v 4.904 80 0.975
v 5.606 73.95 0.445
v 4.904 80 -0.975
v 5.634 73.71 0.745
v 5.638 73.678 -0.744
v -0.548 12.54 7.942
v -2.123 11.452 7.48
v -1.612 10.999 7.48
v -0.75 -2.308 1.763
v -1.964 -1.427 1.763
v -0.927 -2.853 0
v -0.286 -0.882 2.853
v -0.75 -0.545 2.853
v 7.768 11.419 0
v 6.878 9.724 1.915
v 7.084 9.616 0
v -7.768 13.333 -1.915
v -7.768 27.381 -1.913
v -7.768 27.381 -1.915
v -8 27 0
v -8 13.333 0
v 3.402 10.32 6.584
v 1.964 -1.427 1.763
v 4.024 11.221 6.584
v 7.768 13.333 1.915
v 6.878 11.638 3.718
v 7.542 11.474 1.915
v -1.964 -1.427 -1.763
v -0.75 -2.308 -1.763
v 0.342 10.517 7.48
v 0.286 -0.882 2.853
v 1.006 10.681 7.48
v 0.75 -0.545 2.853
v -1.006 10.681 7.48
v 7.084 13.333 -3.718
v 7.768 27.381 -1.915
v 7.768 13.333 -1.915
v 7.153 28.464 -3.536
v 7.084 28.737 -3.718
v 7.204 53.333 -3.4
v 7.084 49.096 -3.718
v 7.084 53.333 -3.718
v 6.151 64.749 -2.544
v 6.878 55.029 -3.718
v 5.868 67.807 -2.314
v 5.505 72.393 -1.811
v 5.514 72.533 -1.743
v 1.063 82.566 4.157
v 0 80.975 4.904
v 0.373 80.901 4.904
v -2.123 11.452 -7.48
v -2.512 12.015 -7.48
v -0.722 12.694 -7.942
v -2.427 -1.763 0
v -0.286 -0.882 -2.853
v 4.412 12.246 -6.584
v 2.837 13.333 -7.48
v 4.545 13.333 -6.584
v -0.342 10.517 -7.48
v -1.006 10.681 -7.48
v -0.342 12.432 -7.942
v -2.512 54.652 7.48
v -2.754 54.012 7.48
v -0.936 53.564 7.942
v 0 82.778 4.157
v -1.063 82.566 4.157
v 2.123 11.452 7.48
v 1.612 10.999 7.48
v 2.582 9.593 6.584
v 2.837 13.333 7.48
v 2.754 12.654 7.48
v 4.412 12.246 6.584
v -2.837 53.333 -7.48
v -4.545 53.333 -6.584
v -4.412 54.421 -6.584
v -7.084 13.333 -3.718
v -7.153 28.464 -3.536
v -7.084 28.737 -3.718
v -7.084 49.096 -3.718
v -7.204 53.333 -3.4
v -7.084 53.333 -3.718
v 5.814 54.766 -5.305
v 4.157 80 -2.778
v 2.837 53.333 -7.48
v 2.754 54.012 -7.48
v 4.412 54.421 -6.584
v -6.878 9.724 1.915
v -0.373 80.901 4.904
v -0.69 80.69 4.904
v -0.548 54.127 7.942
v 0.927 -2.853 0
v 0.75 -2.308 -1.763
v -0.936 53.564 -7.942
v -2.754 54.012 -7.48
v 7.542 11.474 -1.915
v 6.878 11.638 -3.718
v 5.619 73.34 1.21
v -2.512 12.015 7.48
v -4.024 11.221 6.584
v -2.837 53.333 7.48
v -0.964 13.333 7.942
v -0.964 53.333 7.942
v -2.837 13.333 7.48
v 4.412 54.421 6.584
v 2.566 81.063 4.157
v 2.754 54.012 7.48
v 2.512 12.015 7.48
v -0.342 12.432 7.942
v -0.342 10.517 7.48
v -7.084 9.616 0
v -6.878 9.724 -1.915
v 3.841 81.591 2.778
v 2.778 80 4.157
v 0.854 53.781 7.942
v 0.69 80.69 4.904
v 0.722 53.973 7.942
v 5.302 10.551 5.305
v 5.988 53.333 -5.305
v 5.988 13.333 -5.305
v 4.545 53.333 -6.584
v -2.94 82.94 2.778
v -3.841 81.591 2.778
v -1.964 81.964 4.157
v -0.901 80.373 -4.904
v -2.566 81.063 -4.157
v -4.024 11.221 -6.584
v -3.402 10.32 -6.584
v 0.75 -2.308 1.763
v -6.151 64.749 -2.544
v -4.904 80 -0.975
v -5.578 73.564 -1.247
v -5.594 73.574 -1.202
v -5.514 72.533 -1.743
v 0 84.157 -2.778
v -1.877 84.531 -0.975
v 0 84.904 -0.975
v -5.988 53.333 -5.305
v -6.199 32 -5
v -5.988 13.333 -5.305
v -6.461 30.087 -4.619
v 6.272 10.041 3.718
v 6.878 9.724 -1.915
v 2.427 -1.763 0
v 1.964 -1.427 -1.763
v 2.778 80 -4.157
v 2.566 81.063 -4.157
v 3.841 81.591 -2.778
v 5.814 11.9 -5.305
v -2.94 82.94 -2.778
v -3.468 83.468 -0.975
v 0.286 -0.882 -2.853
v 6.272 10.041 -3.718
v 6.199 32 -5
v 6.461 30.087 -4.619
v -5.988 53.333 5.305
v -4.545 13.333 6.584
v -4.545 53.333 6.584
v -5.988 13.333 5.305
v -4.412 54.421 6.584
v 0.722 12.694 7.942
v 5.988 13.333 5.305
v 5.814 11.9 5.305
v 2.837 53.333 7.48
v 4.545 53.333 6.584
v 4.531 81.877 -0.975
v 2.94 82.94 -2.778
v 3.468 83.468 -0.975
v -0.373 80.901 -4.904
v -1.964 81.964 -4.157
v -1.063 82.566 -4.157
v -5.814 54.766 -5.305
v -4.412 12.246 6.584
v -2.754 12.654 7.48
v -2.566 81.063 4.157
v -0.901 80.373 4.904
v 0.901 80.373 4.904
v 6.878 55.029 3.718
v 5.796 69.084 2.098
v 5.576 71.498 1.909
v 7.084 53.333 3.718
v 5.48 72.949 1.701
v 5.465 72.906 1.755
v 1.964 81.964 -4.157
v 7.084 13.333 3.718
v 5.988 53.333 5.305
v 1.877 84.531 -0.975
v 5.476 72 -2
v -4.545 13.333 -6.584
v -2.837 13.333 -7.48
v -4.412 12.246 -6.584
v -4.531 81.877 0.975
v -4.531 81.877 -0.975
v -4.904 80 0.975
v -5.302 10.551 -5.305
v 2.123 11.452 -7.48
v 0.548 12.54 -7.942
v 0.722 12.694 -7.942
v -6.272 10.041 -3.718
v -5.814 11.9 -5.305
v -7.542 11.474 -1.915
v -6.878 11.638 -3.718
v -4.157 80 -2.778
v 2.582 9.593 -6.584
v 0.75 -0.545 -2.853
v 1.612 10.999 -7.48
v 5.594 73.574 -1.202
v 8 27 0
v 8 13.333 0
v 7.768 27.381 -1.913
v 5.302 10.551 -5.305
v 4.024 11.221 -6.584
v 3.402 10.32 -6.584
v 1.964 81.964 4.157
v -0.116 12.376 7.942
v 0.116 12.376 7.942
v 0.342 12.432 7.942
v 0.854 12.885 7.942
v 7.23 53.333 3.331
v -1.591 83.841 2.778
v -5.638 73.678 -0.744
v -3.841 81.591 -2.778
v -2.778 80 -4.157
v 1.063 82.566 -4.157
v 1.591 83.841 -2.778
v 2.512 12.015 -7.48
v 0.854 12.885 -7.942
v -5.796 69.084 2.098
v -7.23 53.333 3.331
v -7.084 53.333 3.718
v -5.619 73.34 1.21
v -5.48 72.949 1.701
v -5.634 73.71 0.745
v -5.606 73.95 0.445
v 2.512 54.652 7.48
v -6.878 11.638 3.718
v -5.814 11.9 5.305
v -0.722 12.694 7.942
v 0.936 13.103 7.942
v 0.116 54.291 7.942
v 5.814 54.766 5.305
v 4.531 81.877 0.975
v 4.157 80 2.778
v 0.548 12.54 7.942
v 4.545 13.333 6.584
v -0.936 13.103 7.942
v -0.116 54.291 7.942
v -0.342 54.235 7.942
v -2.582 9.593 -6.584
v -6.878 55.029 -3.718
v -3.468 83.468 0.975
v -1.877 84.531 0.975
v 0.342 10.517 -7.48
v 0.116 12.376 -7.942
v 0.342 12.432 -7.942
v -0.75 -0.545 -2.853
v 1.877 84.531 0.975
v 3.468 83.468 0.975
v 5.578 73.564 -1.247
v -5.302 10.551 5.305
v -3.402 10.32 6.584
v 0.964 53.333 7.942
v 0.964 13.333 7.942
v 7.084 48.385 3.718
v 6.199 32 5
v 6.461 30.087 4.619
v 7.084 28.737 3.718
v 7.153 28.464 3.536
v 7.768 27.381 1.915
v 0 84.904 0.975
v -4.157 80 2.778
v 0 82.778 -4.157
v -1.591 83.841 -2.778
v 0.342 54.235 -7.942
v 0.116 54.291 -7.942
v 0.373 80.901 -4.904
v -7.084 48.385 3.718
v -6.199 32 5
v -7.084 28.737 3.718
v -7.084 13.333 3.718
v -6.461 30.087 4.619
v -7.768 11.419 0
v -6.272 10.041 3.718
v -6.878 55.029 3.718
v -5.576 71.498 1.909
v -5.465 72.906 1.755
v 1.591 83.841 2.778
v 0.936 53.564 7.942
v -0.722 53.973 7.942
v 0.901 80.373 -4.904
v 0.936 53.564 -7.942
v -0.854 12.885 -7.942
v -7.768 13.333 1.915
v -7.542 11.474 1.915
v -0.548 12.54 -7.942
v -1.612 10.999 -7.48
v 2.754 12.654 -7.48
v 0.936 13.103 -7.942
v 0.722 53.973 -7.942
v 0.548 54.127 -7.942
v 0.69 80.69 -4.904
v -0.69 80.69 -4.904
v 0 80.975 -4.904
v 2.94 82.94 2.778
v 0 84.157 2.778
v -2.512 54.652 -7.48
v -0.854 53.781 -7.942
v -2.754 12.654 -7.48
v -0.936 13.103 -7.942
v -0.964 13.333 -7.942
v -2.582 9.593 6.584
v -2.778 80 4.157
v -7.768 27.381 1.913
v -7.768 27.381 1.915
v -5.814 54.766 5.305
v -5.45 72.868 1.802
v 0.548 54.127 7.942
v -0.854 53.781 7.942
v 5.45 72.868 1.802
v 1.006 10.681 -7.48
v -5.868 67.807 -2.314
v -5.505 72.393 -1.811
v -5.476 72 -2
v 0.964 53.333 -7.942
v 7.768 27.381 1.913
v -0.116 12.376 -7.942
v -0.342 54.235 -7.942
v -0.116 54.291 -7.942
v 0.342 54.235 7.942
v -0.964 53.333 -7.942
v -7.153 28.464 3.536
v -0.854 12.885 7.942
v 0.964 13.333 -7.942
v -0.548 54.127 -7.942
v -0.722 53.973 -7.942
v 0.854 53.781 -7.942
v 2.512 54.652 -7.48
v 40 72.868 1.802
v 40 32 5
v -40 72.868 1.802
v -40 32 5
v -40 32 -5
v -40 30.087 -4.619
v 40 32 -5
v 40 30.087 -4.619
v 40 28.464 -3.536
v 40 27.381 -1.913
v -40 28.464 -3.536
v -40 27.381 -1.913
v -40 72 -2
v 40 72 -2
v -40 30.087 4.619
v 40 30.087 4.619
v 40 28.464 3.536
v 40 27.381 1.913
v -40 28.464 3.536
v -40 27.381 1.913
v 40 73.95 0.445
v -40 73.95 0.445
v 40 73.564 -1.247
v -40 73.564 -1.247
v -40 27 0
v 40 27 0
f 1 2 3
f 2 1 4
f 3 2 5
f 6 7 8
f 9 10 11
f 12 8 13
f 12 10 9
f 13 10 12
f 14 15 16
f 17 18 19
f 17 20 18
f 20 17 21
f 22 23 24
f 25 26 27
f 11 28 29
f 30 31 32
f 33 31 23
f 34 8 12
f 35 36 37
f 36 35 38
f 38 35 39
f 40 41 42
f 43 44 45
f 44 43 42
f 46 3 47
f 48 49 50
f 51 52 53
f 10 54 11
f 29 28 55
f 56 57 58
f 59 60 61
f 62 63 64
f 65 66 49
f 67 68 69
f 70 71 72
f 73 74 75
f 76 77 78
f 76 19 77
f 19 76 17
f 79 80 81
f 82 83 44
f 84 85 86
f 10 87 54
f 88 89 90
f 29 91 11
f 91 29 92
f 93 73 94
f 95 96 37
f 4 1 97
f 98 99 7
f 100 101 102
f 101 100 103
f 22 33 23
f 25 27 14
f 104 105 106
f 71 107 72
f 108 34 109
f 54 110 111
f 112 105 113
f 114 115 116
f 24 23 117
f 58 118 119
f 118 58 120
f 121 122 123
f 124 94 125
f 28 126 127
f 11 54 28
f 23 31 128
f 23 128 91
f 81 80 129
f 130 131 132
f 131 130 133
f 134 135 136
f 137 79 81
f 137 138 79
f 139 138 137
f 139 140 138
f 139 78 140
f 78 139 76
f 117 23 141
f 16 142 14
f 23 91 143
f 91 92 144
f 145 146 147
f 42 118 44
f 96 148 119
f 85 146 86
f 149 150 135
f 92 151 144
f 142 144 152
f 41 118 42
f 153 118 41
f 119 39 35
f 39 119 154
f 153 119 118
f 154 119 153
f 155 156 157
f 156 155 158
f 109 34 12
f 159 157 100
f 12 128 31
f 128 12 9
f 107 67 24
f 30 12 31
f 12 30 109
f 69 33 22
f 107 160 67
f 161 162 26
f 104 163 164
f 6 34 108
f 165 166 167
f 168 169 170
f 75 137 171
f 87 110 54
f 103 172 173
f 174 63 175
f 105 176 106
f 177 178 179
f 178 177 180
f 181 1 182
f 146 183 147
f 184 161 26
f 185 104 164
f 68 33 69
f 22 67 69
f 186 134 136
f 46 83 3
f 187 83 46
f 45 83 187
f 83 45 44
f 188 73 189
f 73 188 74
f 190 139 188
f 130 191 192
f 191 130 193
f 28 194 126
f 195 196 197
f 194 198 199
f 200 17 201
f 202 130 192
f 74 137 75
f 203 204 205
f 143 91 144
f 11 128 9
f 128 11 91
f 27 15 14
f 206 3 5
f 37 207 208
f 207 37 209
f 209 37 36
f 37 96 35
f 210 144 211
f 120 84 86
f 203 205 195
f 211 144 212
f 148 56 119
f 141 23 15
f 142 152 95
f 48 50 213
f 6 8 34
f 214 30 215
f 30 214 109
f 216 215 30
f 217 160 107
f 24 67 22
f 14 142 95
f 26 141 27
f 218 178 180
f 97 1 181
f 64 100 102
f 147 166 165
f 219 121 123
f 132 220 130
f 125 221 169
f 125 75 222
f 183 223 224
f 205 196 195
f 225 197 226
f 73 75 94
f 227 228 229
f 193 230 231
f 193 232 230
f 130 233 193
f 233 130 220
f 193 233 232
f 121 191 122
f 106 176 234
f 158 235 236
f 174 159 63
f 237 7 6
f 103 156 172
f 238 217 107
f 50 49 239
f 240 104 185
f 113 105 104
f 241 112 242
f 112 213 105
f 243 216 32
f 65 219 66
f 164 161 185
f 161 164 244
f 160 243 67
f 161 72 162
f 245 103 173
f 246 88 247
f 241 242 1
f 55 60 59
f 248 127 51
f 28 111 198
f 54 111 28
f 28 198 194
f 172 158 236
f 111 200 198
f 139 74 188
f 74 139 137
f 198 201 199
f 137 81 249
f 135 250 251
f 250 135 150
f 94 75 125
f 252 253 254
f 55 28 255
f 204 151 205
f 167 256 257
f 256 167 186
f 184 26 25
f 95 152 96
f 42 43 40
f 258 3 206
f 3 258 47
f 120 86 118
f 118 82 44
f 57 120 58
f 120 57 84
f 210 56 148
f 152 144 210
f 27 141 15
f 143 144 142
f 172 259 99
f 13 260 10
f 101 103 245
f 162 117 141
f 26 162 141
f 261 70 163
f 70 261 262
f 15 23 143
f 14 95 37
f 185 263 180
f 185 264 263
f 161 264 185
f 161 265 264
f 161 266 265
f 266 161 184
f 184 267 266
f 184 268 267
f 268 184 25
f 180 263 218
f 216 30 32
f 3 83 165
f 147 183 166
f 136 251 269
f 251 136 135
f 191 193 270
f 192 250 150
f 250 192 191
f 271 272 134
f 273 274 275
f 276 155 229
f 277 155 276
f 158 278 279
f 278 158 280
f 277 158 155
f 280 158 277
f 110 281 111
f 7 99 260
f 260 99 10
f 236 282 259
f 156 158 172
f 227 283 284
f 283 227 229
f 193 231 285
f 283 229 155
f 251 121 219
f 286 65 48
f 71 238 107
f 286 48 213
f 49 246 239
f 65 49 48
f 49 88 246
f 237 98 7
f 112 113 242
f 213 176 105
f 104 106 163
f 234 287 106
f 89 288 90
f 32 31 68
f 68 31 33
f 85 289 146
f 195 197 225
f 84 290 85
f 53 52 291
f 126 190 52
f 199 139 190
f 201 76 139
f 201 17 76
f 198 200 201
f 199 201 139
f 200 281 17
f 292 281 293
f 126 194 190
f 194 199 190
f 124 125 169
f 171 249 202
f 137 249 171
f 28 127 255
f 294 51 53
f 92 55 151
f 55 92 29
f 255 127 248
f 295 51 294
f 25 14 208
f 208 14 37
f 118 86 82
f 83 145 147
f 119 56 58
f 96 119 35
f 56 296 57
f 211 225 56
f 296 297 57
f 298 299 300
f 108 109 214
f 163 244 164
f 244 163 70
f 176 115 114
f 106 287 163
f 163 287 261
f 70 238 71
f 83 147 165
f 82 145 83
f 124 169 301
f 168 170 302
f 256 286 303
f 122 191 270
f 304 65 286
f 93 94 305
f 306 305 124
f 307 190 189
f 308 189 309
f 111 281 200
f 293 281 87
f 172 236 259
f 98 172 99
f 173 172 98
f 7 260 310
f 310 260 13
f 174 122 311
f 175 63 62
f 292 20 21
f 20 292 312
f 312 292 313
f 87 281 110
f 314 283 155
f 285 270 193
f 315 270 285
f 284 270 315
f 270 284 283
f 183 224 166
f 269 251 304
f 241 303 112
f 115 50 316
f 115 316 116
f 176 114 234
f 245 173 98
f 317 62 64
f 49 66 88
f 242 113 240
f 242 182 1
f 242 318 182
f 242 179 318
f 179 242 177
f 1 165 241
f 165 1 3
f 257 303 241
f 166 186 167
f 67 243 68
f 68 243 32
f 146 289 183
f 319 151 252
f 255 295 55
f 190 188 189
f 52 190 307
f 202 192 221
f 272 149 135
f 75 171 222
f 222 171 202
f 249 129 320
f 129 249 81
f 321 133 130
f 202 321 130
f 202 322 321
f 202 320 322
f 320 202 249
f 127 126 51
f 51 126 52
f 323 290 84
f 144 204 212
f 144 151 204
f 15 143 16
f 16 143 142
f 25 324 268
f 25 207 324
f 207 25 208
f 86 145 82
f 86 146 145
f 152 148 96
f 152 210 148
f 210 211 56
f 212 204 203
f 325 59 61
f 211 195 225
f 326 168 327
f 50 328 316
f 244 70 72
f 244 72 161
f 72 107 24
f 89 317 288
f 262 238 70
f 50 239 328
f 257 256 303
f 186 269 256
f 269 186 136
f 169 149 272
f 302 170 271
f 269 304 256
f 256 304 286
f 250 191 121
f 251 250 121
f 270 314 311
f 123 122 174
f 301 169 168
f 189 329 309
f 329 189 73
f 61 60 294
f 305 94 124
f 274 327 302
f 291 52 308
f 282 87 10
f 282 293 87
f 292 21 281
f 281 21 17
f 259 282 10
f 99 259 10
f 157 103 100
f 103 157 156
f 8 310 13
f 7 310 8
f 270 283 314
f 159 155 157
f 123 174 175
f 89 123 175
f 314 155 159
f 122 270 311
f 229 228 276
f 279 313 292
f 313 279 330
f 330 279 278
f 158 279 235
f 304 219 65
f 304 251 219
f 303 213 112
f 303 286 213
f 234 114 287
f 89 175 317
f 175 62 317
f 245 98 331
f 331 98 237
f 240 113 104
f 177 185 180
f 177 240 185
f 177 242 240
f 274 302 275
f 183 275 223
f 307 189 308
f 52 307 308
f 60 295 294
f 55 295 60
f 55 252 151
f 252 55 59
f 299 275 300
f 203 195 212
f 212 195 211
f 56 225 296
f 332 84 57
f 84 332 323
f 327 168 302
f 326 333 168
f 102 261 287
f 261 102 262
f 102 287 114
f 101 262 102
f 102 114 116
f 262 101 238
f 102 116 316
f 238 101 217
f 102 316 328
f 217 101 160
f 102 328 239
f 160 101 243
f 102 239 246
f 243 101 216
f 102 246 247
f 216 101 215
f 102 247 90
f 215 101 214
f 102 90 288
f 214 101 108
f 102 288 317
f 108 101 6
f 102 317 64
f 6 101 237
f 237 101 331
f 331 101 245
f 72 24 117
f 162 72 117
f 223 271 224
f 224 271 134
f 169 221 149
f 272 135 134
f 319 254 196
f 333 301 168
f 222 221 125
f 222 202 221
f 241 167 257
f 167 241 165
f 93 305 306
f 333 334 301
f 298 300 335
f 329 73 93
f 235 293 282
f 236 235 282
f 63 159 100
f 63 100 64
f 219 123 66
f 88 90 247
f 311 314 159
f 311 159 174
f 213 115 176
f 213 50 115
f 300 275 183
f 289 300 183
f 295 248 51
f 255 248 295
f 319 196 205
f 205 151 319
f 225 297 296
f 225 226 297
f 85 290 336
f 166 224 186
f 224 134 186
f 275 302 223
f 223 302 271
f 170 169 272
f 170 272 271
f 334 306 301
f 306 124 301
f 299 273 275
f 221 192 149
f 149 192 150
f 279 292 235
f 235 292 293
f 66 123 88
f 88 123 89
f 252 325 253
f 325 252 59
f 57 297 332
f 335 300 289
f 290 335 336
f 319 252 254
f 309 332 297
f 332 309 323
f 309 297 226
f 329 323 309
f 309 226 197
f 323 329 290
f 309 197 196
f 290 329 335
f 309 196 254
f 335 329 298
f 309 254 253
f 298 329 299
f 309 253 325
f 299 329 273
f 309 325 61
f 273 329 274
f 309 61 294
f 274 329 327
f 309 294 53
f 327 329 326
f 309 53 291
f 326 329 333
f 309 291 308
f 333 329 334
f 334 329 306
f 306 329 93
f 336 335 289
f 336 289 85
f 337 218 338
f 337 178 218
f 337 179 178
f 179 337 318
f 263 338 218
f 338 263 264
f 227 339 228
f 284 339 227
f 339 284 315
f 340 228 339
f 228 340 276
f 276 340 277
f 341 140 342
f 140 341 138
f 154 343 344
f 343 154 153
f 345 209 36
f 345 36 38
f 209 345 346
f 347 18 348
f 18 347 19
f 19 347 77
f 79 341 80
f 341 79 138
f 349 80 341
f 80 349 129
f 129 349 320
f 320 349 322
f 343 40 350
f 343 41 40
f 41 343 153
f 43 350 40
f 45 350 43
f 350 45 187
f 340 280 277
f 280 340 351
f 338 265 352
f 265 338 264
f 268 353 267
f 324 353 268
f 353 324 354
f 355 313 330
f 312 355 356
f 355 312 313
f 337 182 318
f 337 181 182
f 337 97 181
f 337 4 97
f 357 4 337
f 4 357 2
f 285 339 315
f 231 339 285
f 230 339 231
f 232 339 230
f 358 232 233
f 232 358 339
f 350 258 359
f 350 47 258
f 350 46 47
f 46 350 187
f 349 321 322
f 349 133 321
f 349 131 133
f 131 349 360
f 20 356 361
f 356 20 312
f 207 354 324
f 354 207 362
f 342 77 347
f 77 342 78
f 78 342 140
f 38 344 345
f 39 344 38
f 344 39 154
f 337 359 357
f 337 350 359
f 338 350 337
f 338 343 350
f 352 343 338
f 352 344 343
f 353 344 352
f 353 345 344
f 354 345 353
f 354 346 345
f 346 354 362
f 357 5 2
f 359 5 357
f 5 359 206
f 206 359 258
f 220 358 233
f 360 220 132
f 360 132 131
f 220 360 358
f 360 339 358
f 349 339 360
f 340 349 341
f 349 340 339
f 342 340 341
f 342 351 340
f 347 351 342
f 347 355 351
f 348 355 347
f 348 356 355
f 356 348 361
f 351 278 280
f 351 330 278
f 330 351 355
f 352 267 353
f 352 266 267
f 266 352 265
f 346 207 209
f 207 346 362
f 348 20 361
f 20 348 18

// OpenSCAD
f_len = 80;
f_rad = 8;
nose_rad = 3;
aft_rad = 5;
s1_y = f_len/6;
s2_y = f_len/1.5;
w_le_rad = 5;
w_te_rad = 2;
wingspan=80;
w_width=40;

module wings() {
	rotate([0,90,0]) {
		hull() {
			cylinder(r=w_le_rad, h=wingspan, center=true);
			translate([0,w_width,0])
			cylinder(r=w_te_rad, h=wingspan, center=true);
		}
	}
}

module fin() {

}

module tail() {

}

module fuselage() {
	
	hull() {
		sphere(nose_rad);
		translate([0,s1_y,0])
		sphere(f_rad);
		translate([0,s2_y,0])
		sphere(f_rad);
		translate([0,f_len,0])
		sphere(aft_rad);
	}
}

module main() {
	fuselage();
	translate([0,f_len/2.5,0])
	wings();
}

main();
